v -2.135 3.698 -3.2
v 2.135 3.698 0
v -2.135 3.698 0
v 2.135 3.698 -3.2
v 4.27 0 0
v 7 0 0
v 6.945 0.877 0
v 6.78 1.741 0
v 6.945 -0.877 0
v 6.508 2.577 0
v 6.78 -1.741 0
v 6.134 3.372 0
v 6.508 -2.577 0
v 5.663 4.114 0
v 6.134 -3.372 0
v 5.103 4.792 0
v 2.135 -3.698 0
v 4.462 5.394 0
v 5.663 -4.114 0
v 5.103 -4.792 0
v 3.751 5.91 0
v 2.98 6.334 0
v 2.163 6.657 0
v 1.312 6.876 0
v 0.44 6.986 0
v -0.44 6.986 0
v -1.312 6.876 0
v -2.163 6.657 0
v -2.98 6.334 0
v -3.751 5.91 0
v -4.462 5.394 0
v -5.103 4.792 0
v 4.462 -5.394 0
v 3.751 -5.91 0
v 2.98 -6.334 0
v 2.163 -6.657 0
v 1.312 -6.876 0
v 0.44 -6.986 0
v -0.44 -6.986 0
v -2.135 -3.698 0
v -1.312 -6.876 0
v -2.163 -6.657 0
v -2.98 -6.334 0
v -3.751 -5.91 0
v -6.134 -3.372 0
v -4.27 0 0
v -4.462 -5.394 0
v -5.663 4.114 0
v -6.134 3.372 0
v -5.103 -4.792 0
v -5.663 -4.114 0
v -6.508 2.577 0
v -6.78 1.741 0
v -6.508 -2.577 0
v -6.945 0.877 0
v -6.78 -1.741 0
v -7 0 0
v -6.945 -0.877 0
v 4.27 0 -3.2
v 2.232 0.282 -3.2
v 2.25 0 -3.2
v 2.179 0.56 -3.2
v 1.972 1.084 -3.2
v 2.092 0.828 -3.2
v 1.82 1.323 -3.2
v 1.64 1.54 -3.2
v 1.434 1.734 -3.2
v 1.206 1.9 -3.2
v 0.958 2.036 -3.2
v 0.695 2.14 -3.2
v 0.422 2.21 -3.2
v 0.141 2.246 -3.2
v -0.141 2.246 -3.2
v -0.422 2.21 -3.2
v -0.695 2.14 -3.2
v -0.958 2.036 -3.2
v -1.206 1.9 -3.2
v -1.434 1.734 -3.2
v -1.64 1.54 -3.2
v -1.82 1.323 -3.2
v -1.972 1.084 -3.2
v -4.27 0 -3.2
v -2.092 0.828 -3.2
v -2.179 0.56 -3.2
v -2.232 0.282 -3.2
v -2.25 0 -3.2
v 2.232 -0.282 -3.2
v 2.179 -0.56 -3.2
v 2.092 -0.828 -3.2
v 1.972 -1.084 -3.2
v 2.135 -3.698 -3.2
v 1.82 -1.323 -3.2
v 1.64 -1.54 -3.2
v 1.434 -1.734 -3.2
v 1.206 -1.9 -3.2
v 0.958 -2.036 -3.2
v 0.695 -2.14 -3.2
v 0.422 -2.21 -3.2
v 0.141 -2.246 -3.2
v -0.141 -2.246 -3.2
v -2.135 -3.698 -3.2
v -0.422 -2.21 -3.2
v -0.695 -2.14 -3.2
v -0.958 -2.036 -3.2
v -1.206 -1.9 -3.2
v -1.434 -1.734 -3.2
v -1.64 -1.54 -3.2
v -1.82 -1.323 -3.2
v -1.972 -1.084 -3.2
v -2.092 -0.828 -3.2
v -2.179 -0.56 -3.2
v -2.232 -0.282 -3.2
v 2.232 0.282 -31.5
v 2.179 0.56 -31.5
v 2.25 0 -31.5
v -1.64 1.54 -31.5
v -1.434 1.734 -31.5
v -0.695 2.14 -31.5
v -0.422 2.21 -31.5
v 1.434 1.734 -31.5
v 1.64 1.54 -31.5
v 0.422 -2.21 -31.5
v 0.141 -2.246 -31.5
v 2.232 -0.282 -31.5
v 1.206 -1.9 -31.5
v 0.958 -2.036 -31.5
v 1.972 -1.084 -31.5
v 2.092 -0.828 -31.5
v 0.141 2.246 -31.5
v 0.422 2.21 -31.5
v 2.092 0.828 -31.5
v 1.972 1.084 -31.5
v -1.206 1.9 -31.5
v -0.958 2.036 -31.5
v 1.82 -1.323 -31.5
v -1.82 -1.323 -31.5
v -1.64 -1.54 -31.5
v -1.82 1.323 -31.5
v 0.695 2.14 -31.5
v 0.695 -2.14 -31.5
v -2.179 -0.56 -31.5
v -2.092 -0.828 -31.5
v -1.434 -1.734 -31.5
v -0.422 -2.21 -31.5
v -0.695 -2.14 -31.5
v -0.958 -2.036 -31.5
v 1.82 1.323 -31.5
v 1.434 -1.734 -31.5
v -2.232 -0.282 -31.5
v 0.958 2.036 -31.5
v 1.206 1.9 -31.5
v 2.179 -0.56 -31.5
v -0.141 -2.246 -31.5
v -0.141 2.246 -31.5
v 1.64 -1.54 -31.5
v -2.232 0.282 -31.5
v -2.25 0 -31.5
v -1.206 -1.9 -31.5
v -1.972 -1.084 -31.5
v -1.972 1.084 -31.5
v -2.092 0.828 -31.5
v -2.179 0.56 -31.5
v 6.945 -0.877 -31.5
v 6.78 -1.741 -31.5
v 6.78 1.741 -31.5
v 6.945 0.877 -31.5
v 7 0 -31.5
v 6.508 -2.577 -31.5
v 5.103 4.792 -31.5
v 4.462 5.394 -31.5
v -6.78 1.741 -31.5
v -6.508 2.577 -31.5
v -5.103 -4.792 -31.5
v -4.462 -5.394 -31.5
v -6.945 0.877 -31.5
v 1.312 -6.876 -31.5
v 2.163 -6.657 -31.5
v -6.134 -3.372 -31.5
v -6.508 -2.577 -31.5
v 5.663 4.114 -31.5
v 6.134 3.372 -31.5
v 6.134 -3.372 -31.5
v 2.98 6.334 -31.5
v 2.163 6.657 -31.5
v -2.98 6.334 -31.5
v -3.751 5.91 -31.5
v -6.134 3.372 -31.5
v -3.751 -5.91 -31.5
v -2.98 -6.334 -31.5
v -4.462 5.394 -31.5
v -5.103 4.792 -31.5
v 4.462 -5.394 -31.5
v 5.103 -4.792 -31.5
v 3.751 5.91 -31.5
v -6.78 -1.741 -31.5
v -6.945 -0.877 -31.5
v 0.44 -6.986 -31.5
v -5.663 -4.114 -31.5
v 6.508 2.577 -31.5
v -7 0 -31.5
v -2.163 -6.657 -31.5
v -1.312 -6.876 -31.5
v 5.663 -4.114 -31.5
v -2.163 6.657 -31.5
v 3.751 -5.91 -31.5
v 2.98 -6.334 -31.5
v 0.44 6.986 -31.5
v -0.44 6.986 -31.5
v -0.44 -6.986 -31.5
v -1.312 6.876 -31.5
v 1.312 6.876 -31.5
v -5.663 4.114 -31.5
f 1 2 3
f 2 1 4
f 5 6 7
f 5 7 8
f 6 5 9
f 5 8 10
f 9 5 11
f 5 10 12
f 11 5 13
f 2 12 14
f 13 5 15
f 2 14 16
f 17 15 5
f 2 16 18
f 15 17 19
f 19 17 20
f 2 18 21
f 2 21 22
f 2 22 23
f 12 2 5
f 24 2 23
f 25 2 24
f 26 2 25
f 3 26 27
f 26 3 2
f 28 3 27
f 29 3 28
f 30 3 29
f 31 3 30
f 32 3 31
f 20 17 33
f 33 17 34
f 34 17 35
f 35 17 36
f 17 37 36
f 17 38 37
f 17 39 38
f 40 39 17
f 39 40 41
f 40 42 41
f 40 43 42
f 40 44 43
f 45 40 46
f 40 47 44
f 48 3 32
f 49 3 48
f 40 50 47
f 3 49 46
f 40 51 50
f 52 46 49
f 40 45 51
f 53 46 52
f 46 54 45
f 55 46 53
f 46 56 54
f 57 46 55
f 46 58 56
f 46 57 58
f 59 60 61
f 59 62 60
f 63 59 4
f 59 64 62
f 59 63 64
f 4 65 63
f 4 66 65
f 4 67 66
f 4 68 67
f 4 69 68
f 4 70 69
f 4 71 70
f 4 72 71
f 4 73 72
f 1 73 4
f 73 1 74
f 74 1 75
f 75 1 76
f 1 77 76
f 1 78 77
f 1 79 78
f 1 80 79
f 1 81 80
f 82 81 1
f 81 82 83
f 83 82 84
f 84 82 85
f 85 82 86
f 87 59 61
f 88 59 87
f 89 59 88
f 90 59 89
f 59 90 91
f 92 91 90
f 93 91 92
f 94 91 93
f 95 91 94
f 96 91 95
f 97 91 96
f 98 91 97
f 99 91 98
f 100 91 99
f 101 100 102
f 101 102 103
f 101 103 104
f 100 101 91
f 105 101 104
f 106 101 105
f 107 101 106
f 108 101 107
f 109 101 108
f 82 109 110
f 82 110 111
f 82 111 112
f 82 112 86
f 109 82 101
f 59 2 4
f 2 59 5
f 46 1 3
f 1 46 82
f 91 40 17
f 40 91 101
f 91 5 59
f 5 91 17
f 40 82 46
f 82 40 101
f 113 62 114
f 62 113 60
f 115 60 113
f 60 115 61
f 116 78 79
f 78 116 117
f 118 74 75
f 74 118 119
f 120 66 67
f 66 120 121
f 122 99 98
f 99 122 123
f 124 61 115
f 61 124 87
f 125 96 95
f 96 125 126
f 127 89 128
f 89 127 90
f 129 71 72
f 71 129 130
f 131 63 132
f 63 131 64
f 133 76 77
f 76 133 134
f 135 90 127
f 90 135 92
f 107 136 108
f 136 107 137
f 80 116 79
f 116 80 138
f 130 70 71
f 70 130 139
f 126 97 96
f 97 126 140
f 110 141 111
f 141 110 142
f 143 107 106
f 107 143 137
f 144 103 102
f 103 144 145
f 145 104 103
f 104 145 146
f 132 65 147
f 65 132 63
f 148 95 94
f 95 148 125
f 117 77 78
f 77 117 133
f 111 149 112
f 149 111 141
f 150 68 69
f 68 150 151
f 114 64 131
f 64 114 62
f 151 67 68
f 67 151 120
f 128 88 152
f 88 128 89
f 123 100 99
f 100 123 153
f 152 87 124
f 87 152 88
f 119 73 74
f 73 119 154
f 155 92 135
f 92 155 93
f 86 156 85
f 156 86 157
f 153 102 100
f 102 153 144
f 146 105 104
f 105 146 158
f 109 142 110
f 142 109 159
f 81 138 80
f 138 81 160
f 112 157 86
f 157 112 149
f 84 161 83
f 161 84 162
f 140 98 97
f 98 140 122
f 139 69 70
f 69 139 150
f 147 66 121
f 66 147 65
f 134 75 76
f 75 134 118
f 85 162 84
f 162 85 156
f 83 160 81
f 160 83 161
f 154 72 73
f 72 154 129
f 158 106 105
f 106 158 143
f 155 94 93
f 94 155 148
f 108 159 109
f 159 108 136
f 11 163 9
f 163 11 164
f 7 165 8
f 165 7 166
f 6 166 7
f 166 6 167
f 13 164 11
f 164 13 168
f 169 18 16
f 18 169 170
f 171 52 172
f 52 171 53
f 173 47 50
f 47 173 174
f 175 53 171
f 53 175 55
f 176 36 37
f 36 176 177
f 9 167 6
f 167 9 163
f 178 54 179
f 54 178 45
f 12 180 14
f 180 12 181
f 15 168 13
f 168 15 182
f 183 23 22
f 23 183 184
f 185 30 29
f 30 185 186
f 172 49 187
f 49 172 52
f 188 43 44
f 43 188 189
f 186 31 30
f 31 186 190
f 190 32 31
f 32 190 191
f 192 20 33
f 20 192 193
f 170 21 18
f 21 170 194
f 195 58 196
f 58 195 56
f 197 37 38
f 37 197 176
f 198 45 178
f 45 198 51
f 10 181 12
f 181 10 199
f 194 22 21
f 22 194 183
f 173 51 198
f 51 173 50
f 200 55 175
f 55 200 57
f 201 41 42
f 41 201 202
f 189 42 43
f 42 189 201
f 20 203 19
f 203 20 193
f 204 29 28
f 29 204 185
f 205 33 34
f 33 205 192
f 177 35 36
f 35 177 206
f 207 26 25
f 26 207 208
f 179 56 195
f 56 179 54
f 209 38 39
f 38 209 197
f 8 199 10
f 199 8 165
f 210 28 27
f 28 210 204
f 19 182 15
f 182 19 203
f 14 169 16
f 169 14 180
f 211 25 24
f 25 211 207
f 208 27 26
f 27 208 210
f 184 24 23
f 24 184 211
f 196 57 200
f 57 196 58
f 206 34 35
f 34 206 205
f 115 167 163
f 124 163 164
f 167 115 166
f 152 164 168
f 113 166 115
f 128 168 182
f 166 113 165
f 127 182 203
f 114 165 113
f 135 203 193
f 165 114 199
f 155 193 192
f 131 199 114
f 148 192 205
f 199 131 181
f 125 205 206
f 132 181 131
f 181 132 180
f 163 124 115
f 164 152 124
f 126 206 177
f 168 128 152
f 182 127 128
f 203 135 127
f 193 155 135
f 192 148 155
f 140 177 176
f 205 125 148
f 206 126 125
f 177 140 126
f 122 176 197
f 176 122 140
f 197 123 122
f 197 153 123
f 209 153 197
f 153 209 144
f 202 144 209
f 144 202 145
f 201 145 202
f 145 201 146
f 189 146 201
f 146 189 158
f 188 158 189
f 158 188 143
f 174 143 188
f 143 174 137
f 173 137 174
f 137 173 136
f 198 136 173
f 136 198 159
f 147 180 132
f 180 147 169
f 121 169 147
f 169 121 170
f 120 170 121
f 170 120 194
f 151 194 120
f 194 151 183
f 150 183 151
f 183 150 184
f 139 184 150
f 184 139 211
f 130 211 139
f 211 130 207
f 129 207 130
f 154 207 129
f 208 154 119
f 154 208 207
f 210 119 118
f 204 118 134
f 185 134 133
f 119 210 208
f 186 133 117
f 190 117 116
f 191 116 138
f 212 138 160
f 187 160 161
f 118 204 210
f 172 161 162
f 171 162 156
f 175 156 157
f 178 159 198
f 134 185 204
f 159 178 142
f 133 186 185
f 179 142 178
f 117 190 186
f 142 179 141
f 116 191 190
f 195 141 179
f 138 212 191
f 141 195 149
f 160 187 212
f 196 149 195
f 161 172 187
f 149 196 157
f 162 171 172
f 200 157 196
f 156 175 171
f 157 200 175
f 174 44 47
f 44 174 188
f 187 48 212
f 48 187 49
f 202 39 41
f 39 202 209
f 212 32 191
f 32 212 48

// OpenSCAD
$fn = 50;

difference() {
	union() {
		translate(v = [0, 0, -31.5]) {
			cylinder(h = 31.5, r = 7.0);
		}
	}
	union() {
		translate(v = [0, 0, 0]) {
			rotate(a = [0, 0, 0]) {
				difference() {
					union() {
						translate(v = [0, 0, -3.2]) {
							linear_extrude(height = 3.2) {
								polygon(points = [[4.2698, 0.0], [2.1349000000000005, 3.697755269078796], [-2.134899999999999, 3.6977552690787965], [-4.2698, 5.228996902999369e-16], [-2.134900000000002, -3.6977552690787956], [2.1348999999999974, -3.697755269078798]]);
							}
						}
					}
					union();
				}
			}
		}
		#translate(v = [0, 0, -100.0]) {
			cylinder(h = 200, r = 2.25);
		}
	}
}
